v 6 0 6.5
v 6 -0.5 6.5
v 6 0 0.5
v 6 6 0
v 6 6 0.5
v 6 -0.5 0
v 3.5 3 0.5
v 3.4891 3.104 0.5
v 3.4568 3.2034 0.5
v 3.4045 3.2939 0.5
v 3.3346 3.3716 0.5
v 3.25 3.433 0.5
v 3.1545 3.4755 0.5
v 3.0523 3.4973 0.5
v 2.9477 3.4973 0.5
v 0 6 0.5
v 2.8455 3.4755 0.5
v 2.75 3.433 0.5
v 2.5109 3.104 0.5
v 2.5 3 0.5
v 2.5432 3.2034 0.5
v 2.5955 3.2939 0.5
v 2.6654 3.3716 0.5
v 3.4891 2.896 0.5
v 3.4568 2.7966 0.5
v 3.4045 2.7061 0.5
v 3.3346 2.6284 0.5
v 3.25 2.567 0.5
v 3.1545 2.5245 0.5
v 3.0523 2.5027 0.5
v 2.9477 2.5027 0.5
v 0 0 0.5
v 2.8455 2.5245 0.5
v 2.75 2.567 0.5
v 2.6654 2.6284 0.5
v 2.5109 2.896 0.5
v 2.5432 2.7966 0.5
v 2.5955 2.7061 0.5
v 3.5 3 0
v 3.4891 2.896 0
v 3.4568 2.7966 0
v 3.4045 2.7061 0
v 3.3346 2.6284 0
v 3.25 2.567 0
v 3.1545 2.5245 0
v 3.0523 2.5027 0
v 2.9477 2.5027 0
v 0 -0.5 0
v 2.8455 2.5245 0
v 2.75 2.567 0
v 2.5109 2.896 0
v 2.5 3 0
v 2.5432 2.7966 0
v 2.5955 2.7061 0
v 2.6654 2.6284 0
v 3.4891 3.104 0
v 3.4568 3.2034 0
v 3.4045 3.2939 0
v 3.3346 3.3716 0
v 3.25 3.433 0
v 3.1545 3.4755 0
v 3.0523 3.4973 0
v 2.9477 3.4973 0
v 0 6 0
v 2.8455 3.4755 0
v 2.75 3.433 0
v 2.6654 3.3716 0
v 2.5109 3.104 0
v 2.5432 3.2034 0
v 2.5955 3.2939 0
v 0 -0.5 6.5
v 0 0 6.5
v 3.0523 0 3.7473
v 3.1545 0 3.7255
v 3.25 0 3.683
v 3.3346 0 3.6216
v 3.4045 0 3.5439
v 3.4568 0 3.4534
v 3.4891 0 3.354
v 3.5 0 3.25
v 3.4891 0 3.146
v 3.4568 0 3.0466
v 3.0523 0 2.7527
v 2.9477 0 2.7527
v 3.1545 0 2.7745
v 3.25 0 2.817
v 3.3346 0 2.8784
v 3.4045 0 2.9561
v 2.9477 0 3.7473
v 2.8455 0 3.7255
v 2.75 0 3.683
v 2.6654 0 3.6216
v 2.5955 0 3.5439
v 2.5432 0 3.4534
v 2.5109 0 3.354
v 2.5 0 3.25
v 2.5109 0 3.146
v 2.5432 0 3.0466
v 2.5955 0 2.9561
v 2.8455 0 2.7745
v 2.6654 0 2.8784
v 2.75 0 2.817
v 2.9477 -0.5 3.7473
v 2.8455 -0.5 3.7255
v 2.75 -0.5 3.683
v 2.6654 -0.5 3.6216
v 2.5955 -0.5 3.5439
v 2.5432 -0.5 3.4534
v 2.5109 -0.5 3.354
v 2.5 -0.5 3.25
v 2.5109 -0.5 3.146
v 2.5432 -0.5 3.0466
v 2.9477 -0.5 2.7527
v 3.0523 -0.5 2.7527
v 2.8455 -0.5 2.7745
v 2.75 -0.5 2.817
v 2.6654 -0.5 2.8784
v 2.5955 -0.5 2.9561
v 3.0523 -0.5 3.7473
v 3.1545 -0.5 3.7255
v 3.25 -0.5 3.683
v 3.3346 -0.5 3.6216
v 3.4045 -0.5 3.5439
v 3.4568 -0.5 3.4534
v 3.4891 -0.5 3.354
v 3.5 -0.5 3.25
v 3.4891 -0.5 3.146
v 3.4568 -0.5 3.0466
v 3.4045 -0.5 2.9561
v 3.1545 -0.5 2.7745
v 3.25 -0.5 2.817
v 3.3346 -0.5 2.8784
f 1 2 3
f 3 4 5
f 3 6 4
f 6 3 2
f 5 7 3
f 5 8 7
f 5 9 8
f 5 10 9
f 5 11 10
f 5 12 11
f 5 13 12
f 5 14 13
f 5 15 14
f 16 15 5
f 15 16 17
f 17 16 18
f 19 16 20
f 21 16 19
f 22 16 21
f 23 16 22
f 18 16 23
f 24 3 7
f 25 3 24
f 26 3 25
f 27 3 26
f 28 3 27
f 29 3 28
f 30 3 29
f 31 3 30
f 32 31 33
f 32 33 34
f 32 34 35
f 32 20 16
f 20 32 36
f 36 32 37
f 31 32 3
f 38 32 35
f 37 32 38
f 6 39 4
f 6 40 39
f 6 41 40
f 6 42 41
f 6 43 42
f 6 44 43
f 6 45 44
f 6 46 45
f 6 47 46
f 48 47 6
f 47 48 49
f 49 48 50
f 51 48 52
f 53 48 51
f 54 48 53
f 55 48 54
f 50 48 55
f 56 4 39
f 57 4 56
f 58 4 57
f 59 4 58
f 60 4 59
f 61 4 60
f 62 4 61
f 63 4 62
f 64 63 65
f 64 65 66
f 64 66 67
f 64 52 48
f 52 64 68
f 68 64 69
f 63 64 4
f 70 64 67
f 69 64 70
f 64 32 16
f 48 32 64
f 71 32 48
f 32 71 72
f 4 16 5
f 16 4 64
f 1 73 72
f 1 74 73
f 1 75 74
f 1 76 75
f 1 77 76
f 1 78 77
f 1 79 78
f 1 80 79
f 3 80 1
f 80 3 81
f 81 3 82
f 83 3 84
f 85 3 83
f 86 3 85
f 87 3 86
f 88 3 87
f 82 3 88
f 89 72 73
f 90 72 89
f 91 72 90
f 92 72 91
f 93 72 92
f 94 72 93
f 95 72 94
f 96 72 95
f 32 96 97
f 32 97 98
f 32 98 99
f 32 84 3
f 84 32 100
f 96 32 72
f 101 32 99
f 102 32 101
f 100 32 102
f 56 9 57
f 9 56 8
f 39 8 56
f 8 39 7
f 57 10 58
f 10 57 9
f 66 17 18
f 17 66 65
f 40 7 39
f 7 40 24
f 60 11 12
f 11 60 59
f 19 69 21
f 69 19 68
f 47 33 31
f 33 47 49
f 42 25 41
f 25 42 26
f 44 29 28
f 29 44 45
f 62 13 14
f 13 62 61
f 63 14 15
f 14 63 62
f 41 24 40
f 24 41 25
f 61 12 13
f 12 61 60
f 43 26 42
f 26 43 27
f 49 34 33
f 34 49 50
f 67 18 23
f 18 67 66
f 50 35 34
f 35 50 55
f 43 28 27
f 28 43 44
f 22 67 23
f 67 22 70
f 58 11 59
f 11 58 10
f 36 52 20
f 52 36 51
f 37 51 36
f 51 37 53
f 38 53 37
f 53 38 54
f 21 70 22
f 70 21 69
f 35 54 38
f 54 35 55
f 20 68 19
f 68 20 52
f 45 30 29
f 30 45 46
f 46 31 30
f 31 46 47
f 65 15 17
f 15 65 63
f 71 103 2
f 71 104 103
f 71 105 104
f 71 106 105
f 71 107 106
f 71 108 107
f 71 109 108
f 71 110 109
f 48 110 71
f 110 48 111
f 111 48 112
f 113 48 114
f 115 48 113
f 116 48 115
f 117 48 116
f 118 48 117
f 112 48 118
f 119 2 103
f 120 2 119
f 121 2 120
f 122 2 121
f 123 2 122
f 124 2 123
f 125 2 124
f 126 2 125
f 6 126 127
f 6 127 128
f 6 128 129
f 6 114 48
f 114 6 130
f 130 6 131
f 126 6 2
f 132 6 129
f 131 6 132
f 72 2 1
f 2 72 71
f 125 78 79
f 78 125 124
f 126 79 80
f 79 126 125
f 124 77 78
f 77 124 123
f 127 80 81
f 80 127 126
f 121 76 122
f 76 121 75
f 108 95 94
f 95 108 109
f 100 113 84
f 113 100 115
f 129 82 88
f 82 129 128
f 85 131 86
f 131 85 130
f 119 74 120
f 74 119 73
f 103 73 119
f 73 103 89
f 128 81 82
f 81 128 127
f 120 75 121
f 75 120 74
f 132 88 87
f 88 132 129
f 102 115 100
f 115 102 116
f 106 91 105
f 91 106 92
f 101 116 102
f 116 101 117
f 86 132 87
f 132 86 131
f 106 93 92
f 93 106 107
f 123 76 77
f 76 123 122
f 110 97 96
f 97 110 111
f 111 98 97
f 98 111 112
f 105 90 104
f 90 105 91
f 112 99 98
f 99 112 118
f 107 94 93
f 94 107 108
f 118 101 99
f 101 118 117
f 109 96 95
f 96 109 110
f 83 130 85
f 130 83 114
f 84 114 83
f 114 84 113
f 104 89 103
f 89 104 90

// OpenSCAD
module plate(length, width, thickness) {
    difference() {
        cube([length, width, thickness]);
        translate([length/2, width/2, 0]) {
            cylinder(r = 0.5, h = 1, $fn = 30);
        }
    }
}

module bracket(length, width, thickness) {
    plate (length, width, thickness);
    rotate(a = 90, v=[1, 0, 0]) plate (length, width+thickness, thickness);
}

bracket(6, 6, 0.5);
